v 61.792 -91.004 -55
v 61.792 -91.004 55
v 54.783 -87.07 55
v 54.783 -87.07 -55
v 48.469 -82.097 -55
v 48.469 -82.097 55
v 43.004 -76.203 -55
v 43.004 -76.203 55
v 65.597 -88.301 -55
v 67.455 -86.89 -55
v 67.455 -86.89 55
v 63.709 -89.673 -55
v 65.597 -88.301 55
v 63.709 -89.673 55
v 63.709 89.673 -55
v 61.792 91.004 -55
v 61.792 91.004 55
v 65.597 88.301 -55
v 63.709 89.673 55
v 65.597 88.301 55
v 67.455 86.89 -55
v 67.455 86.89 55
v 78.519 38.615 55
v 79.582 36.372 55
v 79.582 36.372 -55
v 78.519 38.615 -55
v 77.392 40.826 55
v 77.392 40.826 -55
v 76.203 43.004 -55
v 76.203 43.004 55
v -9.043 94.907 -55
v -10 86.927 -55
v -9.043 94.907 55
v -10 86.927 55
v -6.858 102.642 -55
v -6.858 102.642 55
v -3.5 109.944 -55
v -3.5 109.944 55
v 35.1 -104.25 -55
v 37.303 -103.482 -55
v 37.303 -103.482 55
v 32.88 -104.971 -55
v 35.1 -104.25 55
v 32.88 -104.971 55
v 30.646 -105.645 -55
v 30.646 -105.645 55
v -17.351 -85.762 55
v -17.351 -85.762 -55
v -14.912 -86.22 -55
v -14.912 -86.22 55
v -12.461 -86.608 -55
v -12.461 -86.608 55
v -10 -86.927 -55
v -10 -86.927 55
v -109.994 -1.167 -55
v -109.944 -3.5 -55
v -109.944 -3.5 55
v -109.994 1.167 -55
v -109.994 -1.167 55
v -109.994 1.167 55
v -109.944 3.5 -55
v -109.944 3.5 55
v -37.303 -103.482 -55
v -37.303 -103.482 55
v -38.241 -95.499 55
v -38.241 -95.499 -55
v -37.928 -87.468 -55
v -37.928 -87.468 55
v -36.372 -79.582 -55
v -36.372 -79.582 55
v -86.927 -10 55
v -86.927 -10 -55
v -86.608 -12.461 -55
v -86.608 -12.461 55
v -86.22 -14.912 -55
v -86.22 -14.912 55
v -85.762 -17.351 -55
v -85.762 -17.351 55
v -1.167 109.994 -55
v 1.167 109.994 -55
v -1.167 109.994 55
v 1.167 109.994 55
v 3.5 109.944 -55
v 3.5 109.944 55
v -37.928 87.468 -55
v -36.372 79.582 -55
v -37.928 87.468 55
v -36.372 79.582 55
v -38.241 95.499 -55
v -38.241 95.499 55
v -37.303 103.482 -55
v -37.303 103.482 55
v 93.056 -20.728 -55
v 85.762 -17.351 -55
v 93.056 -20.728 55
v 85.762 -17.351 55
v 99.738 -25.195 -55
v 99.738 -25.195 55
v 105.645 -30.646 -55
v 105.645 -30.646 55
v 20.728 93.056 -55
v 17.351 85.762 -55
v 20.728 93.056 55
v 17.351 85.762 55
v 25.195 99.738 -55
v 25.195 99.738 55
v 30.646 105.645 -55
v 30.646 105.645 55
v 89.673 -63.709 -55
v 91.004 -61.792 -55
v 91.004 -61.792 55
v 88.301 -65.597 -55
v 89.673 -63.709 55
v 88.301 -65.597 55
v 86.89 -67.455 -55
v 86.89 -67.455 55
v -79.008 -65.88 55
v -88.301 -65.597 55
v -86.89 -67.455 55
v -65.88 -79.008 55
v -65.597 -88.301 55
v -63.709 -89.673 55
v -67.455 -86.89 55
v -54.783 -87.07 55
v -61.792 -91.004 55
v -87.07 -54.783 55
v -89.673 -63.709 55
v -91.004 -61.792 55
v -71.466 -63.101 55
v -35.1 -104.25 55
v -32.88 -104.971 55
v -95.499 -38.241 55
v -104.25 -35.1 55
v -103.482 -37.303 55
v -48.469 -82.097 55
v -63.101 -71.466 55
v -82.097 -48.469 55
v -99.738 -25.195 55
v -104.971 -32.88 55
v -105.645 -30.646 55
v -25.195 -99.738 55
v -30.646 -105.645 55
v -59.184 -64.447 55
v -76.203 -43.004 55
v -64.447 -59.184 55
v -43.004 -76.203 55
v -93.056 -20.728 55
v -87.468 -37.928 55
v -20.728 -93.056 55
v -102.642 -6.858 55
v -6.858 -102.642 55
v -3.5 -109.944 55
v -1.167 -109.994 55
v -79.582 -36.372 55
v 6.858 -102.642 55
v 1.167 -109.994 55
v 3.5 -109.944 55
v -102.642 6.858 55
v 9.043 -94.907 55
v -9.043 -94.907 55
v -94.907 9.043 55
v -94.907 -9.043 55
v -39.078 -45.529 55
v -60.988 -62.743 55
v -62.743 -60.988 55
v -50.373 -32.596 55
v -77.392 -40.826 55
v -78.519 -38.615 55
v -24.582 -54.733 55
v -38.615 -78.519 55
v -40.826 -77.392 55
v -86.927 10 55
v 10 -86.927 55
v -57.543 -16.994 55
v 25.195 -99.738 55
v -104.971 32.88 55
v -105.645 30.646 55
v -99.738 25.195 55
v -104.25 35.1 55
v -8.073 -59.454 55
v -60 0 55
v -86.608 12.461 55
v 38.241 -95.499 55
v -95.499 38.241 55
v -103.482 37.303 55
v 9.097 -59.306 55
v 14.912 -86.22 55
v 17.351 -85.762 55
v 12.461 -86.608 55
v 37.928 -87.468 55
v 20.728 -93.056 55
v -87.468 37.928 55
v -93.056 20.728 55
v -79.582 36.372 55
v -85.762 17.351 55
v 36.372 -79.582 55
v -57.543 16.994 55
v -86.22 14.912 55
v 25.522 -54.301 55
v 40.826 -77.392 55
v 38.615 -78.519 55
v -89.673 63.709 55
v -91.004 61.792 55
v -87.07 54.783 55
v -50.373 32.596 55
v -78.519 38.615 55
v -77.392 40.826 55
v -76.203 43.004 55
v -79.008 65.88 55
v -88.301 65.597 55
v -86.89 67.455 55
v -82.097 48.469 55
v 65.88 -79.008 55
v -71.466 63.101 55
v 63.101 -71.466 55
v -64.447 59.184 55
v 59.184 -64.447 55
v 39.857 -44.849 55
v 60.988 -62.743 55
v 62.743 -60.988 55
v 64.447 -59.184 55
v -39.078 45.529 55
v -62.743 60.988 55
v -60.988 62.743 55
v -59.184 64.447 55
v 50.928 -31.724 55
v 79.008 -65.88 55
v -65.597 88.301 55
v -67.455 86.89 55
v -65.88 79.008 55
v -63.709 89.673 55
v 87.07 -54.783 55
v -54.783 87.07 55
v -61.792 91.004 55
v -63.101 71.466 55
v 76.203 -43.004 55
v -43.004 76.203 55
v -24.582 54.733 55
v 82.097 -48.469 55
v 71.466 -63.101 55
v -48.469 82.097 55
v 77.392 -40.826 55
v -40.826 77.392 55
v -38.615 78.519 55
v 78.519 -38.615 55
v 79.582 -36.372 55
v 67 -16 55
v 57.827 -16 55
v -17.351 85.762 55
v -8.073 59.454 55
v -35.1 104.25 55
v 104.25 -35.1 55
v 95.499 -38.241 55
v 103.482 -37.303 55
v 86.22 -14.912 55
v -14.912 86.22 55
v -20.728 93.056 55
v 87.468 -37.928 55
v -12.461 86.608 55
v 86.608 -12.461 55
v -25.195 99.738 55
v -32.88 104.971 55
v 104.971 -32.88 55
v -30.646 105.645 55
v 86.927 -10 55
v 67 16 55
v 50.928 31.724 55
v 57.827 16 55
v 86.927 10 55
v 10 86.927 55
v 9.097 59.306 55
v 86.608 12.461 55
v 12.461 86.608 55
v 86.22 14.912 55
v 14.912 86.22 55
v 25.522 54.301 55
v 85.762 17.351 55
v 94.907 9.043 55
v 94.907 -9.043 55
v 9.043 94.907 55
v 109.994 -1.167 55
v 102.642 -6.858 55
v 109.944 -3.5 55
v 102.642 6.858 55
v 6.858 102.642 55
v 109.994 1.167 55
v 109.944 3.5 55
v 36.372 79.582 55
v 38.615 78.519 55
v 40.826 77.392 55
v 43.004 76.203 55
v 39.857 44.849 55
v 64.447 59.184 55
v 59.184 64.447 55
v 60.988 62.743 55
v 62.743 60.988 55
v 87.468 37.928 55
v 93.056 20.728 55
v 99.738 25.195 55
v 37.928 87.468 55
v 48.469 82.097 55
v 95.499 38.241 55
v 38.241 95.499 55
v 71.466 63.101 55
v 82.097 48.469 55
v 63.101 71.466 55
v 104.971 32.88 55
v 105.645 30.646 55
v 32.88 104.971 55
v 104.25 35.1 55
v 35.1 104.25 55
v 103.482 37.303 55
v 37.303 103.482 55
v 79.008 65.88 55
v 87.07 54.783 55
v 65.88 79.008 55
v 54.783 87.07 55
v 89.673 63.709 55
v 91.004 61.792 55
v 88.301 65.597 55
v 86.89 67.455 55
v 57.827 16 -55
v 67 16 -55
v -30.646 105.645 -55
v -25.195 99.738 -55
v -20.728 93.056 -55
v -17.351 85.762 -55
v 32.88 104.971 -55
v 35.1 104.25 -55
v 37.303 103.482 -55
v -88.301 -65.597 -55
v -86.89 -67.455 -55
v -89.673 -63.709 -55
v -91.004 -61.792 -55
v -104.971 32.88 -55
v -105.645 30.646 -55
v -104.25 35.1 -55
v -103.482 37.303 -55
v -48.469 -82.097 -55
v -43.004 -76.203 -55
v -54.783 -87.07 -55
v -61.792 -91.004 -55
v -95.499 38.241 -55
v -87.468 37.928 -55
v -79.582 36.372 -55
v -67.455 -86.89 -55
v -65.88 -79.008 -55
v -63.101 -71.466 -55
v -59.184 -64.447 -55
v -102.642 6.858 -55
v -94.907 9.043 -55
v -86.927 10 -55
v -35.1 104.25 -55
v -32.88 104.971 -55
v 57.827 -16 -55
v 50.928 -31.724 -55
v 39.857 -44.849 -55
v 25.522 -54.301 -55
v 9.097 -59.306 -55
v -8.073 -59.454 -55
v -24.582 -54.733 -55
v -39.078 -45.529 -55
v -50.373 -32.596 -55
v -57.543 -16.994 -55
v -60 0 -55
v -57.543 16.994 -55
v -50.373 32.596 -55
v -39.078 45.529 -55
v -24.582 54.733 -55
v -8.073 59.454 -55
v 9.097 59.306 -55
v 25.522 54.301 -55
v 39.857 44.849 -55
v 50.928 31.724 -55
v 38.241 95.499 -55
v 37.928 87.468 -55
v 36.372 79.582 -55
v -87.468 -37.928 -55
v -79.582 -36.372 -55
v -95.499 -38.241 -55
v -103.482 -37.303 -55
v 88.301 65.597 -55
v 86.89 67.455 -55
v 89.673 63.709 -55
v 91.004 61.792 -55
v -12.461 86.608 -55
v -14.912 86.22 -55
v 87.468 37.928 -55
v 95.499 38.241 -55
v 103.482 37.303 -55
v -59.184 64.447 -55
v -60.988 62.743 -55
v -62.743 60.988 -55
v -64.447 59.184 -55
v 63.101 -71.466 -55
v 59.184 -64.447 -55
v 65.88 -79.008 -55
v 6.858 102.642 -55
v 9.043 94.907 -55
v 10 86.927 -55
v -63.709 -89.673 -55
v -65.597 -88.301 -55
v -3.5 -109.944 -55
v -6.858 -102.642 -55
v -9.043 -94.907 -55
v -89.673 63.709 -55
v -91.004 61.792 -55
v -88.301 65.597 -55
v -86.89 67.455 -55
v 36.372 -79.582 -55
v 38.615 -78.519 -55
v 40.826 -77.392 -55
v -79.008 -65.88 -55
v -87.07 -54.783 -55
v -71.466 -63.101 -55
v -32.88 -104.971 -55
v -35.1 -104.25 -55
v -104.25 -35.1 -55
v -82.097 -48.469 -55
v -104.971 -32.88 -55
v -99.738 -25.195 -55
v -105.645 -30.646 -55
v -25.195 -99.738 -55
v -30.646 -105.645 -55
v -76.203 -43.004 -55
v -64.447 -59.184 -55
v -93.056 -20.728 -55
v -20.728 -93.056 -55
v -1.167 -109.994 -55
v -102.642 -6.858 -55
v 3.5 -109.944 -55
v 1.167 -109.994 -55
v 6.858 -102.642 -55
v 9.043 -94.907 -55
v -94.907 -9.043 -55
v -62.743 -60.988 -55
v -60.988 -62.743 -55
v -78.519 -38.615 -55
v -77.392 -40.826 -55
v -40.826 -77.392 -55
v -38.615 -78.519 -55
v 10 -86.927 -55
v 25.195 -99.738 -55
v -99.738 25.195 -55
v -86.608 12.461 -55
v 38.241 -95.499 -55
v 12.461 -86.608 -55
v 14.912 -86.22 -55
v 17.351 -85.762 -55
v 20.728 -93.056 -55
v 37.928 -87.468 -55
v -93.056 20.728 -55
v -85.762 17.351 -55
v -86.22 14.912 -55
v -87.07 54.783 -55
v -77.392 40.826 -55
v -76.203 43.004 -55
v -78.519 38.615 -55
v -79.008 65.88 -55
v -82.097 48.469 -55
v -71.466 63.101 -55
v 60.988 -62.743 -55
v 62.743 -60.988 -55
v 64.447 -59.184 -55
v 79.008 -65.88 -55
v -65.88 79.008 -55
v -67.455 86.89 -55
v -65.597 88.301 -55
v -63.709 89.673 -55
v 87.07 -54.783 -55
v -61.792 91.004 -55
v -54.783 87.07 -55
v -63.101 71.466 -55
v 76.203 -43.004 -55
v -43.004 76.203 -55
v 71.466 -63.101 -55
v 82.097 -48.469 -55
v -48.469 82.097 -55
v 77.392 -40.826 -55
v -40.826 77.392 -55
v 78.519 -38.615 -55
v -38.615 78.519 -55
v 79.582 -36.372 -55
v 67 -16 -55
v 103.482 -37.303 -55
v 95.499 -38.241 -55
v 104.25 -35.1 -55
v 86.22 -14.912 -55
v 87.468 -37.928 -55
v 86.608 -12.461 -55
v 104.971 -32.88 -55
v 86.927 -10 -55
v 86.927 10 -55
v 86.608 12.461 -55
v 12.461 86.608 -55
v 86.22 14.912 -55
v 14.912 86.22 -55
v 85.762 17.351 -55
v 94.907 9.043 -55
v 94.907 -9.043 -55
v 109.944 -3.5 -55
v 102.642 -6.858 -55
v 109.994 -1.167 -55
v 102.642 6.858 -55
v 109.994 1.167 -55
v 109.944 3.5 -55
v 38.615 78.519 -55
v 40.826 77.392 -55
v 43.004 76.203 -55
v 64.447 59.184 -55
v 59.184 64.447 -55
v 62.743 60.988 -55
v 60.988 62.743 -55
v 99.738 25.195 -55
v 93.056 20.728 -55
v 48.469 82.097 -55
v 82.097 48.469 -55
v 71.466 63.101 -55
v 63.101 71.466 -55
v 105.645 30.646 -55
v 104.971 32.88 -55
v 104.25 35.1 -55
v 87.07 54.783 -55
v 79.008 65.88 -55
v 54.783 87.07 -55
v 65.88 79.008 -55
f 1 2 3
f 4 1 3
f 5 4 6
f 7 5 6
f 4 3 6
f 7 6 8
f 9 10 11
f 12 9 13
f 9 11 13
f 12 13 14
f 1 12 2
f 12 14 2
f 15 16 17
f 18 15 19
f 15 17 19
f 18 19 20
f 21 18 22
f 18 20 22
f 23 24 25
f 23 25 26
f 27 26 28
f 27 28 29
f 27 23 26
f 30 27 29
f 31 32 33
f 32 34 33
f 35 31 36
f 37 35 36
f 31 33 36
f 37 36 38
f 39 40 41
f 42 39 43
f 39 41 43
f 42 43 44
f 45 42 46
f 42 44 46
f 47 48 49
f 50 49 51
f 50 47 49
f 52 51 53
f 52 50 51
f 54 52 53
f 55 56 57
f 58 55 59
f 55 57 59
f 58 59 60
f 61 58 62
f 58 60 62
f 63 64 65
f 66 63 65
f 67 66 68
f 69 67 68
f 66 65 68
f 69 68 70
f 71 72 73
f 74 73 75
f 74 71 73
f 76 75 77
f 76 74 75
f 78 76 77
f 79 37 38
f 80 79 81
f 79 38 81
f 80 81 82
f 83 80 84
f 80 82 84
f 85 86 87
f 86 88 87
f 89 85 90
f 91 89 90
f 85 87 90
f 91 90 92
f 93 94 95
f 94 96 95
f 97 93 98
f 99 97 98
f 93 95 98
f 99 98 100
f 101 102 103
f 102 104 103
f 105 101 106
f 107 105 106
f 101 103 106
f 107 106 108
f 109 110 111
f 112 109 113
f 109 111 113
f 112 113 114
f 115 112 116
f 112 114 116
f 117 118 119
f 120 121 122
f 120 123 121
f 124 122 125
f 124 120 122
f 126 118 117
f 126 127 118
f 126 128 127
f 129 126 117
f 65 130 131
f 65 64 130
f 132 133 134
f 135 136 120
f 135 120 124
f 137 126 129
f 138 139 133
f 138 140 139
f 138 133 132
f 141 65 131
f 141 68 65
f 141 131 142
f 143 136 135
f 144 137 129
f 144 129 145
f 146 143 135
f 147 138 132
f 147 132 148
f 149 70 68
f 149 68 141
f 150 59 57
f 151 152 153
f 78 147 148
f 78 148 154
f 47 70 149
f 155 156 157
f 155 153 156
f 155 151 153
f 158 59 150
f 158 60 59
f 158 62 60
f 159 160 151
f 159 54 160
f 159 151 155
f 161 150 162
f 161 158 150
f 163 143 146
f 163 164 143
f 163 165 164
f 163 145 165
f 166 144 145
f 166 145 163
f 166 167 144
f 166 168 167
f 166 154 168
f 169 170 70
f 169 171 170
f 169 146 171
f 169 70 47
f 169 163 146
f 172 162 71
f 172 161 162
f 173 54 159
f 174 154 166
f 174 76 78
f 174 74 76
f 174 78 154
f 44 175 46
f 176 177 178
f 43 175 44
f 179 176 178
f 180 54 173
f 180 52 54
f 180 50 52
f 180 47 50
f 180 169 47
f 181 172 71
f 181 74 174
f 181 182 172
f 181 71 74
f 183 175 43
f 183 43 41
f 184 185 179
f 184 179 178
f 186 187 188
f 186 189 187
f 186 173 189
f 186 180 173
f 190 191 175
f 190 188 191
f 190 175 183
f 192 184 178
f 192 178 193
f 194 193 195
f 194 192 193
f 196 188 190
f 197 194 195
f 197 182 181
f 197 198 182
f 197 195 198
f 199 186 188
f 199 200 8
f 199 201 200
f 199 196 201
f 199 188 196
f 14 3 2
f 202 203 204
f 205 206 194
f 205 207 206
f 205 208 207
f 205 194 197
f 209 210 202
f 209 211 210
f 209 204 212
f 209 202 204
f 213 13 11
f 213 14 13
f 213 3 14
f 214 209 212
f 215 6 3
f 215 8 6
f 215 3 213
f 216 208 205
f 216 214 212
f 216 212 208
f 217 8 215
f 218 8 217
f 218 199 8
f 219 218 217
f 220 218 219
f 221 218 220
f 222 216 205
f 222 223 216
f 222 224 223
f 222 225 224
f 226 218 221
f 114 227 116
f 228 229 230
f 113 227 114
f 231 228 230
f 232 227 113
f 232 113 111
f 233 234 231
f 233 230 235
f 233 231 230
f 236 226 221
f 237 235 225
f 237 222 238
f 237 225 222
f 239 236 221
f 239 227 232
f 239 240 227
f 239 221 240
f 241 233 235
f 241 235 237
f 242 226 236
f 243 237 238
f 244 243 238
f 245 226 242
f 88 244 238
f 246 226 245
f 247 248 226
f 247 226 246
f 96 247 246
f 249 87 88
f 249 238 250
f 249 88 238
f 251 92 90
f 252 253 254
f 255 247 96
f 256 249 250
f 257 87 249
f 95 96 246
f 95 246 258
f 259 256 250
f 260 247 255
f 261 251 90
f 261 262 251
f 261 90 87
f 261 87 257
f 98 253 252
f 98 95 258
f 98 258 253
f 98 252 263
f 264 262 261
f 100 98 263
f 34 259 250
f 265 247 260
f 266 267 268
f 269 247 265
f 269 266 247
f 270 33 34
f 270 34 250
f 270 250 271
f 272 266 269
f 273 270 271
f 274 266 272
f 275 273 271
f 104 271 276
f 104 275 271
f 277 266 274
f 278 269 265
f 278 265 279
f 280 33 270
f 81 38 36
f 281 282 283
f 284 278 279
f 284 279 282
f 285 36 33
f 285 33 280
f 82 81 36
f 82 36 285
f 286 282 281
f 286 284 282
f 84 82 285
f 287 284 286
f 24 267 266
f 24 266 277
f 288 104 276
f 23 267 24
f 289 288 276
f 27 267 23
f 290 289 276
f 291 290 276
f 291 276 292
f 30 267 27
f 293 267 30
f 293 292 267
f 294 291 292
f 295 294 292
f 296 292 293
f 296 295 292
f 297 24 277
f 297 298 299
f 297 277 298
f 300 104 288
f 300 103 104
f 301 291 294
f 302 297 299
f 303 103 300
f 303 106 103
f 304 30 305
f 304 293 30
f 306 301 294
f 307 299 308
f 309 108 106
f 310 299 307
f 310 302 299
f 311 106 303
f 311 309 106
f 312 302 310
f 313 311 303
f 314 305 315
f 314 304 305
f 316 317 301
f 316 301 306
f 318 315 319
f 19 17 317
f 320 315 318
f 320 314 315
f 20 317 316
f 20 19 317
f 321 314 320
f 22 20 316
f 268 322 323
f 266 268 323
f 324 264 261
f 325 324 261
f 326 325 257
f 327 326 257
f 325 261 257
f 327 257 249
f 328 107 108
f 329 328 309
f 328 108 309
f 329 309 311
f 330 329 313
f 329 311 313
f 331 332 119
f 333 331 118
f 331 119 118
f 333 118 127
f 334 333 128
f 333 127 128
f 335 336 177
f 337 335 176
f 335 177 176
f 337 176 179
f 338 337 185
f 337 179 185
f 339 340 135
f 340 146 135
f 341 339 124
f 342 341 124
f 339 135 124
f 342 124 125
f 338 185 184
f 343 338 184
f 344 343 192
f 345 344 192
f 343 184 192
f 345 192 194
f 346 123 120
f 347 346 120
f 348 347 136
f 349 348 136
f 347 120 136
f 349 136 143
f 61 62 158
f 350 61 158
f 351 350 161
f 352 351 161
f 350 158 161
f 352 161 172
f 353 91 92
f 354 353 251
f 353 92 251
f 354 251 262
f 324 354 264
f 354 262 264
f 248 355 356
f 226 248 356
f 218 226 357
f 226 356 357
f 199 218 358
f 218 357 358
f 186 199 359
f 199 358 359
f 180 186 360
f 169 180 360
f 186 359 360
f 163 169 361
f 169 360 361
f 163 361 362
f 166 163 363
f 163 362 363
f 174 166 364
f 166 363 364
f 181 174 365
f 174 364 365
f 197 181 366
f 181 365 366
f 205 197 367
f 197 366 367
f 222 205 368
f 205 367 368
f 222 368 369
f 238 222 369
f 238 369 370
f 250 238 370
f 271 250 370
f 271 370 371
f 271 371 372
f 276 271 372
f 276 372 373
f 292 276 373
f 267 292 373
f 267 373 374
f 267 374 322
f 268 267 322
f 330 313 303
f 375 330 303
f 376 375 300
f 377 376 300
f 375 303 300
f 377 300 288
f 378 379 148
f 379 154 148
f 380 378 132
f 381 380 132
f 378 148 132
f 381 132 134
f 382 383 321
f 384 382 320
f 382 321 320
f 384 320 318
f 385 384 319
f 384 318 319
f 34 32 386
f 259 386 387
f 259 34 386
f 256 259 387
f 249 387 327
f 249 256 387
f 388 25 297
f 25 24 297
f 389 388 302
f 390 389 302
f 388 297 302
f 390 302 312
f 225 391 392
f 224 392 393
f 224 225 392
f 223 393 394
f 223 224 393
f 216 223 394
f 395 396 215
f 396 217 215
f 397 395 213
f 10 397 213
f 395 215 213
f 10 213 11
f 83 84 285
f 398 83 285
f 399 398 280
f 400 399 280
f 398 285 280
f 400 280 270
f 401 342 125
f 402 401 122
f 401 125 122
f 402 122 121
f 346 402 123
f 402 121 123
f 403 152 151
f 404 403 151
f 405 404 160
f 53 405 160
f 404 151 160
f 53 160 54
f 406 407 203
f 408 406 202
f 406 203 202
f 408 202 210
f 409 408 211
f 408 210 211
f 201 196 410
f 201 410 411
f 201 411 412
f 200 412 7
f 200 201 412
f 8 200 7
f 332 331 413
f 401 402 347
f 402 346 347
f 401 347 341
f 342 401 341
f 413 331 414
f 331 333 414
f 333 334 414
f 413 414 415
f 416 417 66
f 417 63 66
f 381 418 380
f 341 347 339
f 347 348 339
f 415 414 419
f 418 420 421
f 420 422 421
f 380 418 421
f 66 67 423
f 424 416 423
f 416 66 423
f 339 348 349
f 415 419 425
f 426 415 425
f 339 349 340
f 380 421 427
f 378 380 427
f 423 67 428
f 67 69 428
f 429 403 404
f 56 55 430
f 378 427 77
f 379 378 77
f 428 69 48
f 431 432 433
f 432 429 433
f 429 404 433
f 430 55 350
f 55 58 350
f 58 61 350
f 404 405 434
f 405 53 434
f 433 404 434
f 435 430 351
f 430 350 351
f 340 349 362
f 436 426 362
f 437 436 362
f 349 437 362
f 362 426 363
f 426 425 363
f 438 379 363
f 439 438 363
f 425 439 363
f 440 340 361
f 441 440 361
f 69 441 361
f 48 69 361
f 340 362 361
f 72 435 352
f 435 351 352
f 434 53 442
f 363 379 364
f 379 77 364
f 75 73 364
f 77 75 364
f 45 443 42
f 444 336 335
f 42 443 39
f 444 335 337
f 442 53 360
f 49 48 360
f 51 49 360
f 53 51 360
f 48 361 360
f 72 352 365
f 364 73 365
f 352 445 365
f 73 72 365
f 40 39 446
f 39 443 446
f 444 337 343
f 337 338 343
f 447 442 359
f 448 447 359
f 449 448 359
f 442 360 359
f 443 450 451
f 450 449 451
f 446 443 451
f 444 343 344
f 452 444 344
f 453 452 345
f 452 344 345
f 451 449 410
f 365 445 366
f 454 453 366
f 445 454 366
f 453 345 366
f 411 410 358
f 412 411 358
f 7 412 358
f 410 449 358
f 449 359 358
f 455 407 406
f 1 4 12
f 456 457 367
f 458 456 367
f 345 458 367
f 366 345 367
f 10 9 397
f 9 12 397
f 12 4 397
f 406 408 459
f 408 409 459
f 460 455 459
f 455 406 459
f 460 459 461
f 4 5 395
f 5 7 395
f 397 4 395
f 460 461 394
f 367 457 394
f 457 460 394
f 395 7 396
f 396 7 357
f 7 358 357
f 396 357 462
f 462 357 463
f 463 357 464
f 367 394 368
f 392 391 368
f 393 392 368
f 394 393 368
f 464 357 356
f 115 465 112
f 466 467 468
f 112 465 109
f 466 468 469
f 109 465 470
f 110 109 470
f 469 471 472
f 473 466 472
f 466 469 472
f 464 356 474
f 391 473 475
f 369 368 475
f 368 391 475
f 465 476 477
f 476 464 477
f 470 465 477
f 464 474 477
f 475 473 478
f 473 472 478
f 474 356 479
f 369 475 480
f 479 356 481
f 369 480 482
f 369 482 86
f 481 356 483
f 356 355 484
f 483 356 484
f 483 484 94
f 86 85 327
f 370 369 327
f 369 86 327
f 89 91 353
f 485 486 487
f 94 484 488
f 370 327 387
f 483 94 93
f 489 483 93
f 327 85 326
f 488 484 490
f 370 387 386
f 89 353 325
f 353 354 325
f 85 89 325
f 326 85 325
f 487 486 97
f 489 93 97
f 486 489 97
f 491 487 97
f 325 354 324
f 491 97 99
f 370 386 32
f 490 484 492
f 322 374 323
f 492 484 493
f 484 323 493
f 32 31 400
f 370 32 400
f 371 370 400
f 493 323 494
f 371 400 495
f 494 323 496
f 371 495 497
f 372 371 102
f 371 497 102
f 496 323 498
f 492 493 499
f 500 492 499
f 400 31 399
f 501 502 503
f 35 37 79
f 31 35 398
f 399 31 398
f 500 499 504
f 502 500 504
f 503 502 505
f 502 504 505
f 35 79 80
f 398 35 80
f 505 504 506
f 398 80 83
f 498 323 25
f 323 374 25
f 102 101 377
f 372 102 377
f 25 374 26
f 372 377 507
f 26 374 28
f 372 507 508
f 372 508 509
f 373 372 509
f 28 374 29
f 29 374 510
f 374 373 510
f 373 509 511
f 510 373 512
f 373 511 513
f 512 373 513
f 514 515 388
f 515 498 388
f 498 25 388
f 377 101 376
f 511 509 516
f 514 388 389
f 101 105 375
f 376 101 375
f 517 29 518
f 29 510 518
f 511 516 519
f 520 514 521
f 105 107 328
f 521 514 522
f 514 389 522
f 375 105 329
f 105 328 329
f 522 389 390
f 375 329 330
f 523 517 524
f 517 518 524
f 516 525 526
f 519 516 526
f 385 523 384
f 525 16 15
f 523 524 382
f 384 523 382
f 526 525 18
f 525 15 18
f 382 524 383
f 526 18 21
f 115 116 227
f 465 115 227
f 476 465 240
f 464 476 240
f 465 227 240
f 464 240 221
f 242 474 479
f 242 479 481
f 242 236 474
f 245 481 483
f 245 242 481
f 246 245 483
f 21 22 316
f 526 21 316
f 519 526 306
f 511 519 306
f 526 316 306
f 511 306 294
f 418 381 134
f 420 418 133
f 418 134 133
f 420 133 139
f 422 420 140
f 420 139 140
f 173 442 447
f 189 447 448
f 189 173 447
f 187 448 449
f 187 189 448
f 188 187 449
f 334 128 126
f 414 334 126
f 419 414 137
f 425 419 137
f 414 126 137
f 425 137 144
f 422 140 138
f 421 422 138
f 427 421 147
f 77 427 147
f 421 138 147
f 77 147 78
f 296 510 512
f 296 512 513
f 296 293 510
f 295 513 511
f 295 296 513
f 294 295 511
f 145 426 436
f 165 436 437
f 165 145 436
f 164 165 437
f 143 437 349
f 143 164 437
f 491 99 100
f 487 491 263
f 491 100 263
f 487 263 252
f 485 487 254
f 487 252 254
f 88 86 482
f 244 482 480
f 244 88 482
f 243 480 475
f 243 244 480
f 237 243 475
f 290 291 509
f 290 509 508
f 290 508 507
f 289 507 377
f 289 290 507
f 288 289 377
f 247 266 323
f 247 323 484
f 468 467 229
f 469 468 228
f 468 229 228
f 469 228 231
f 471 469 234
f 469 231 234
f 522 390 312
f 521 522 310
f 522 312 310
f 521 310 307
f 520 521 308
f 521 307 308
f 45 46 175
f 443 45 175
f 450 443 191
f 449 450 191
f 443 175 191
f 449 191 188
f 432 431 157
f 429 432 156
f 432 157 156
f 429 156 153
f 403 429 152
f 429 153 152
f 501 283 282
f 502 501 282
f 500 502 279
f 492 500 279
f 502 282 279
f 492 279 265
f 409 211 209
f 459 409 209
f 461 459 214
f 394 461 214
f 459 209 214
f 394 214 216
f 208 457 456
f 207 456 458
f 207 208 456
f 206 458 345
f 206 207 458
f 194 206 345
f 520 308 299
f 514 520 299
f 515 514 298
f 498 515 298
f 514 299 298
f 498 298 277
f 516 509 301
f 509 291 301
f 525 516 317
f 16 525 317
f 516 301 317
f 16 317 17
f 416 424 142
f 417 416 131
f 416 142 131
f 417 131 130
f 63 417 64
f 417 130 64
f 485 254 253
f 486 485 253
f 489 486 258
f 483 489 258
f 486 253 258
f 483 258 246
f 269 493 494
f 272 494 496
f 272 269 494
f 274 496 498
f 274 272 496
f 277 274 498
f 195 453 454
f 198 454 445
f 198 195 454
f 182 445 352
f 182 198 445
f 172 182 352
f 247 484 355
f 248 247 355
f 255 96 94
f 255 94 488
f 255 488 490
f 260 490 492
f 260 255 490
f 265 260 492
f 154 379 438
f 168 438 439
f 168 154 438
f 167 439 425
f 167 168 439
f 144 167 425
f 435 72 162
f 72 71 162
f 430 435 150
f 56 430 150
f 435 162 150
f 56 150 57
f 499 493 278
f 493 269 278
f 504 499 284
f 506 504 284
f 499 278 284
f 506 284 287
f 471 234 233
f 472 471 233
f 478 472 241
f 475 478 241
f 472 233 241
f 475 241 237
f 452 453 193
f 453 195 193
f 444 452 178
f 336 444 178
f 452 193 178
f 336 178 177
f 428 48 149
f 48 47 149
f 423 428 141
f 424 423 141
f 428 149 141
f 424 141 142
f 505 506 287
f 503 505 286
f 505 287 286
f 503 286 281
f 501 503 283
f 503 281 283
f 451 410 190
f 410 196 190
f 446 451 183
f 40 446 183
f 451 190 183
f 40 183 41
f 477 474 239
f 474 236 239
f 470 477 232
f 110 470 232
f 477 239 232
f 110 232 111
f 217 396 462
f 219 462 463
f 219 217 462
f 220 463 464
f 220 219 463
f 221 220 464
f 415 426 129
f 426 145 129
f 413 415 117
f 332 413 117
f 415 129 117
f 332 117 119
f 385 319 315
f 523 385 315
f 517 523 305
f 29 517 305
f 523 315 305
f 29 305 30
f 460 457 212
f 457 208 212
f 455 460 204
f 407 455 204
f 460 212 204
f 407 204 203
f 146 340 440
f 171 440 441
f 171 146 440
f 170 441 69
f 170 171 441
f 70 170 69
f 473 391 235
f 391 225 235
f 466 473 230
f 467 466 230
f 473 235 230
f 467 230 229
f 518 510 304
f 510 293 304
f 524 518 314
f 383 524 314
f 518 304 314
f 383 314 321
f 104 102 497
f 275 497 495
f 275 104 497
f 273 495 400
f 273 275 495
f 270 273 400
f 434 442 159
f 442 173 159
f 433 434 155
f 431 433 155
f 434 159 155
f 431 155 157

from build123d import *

# Parameters (mm, degrees)
SKETCH_1_R               = 87.5
EXTRUDE_1_DEPTH          = 55
EXTRUDE_2_DEPTH          = 55
PATTERN_CIRCULAR_1_COUNT = 20
CUT_EXTRUDE_1_DEPTH      = 191.525588833


with BuildPart() as part:
    # 草图1 → 拉伸1 (new, symmetric)
    with BuildSketch(Plane.XY):
        Circle(SKETCH_1_R)
    extrude(amount=EXTRUDE_1_DEPTH, both=True)

    # 草图2 → 拉伸2 (add, symmetric)
    with BuildSketch(Plane.XY):
        with BuildLine():
            ThreePointArc((10, 86.926693254), (0, 87.5), (-10, 86.926693254))
            ThreePointArc((-10, 86.926693254), (-8.101258535, 98.817083904), (-3.5, 109.944304082))
            ThreePointArc((-3.5, 109.944304082), (0, 110), (3.5, 109.944304082))
            ThreePointArc((3.5, 109.944304082), (8.101258535, 98.817083904), (10, 86.926693254))
        make_face()
    extrude_2 = extrude(amount=EXTRUDE_2_DEPTH, both=True)

    # 阵列(圆周)1: 拉伸2 ×20 about axis
    pattern_circular_1_axis = Axis((0, 0, 0), (0, 0, 1))
    for i in range(1, PATTERN_CIRCULAR_1_COUNT):
        add(extrude_2.rotate(pattern_circular_1_axis, i * 360 / PATTERN_CIRCULAR_1_COUNT))

    # 草图3 → 切除-拉伸1 (cut, through all)
    with BuildSketch(Plane.XY.offset(-55)):
        with BuildLine():
            Line((57.827329179, 16), (67, 16))
            Line((67, 16), (67, -16))
            Line((67, -16), (57.827329179, -16))
            ThreePointArc((57.827329179, -16), (-60, 0), (57.827329179, 16))
        make_face()
    extrude(amount=CUT_EXTRUDE_1_DEPTH, mode=Mode.SUBTRACT)


solid = part.part
